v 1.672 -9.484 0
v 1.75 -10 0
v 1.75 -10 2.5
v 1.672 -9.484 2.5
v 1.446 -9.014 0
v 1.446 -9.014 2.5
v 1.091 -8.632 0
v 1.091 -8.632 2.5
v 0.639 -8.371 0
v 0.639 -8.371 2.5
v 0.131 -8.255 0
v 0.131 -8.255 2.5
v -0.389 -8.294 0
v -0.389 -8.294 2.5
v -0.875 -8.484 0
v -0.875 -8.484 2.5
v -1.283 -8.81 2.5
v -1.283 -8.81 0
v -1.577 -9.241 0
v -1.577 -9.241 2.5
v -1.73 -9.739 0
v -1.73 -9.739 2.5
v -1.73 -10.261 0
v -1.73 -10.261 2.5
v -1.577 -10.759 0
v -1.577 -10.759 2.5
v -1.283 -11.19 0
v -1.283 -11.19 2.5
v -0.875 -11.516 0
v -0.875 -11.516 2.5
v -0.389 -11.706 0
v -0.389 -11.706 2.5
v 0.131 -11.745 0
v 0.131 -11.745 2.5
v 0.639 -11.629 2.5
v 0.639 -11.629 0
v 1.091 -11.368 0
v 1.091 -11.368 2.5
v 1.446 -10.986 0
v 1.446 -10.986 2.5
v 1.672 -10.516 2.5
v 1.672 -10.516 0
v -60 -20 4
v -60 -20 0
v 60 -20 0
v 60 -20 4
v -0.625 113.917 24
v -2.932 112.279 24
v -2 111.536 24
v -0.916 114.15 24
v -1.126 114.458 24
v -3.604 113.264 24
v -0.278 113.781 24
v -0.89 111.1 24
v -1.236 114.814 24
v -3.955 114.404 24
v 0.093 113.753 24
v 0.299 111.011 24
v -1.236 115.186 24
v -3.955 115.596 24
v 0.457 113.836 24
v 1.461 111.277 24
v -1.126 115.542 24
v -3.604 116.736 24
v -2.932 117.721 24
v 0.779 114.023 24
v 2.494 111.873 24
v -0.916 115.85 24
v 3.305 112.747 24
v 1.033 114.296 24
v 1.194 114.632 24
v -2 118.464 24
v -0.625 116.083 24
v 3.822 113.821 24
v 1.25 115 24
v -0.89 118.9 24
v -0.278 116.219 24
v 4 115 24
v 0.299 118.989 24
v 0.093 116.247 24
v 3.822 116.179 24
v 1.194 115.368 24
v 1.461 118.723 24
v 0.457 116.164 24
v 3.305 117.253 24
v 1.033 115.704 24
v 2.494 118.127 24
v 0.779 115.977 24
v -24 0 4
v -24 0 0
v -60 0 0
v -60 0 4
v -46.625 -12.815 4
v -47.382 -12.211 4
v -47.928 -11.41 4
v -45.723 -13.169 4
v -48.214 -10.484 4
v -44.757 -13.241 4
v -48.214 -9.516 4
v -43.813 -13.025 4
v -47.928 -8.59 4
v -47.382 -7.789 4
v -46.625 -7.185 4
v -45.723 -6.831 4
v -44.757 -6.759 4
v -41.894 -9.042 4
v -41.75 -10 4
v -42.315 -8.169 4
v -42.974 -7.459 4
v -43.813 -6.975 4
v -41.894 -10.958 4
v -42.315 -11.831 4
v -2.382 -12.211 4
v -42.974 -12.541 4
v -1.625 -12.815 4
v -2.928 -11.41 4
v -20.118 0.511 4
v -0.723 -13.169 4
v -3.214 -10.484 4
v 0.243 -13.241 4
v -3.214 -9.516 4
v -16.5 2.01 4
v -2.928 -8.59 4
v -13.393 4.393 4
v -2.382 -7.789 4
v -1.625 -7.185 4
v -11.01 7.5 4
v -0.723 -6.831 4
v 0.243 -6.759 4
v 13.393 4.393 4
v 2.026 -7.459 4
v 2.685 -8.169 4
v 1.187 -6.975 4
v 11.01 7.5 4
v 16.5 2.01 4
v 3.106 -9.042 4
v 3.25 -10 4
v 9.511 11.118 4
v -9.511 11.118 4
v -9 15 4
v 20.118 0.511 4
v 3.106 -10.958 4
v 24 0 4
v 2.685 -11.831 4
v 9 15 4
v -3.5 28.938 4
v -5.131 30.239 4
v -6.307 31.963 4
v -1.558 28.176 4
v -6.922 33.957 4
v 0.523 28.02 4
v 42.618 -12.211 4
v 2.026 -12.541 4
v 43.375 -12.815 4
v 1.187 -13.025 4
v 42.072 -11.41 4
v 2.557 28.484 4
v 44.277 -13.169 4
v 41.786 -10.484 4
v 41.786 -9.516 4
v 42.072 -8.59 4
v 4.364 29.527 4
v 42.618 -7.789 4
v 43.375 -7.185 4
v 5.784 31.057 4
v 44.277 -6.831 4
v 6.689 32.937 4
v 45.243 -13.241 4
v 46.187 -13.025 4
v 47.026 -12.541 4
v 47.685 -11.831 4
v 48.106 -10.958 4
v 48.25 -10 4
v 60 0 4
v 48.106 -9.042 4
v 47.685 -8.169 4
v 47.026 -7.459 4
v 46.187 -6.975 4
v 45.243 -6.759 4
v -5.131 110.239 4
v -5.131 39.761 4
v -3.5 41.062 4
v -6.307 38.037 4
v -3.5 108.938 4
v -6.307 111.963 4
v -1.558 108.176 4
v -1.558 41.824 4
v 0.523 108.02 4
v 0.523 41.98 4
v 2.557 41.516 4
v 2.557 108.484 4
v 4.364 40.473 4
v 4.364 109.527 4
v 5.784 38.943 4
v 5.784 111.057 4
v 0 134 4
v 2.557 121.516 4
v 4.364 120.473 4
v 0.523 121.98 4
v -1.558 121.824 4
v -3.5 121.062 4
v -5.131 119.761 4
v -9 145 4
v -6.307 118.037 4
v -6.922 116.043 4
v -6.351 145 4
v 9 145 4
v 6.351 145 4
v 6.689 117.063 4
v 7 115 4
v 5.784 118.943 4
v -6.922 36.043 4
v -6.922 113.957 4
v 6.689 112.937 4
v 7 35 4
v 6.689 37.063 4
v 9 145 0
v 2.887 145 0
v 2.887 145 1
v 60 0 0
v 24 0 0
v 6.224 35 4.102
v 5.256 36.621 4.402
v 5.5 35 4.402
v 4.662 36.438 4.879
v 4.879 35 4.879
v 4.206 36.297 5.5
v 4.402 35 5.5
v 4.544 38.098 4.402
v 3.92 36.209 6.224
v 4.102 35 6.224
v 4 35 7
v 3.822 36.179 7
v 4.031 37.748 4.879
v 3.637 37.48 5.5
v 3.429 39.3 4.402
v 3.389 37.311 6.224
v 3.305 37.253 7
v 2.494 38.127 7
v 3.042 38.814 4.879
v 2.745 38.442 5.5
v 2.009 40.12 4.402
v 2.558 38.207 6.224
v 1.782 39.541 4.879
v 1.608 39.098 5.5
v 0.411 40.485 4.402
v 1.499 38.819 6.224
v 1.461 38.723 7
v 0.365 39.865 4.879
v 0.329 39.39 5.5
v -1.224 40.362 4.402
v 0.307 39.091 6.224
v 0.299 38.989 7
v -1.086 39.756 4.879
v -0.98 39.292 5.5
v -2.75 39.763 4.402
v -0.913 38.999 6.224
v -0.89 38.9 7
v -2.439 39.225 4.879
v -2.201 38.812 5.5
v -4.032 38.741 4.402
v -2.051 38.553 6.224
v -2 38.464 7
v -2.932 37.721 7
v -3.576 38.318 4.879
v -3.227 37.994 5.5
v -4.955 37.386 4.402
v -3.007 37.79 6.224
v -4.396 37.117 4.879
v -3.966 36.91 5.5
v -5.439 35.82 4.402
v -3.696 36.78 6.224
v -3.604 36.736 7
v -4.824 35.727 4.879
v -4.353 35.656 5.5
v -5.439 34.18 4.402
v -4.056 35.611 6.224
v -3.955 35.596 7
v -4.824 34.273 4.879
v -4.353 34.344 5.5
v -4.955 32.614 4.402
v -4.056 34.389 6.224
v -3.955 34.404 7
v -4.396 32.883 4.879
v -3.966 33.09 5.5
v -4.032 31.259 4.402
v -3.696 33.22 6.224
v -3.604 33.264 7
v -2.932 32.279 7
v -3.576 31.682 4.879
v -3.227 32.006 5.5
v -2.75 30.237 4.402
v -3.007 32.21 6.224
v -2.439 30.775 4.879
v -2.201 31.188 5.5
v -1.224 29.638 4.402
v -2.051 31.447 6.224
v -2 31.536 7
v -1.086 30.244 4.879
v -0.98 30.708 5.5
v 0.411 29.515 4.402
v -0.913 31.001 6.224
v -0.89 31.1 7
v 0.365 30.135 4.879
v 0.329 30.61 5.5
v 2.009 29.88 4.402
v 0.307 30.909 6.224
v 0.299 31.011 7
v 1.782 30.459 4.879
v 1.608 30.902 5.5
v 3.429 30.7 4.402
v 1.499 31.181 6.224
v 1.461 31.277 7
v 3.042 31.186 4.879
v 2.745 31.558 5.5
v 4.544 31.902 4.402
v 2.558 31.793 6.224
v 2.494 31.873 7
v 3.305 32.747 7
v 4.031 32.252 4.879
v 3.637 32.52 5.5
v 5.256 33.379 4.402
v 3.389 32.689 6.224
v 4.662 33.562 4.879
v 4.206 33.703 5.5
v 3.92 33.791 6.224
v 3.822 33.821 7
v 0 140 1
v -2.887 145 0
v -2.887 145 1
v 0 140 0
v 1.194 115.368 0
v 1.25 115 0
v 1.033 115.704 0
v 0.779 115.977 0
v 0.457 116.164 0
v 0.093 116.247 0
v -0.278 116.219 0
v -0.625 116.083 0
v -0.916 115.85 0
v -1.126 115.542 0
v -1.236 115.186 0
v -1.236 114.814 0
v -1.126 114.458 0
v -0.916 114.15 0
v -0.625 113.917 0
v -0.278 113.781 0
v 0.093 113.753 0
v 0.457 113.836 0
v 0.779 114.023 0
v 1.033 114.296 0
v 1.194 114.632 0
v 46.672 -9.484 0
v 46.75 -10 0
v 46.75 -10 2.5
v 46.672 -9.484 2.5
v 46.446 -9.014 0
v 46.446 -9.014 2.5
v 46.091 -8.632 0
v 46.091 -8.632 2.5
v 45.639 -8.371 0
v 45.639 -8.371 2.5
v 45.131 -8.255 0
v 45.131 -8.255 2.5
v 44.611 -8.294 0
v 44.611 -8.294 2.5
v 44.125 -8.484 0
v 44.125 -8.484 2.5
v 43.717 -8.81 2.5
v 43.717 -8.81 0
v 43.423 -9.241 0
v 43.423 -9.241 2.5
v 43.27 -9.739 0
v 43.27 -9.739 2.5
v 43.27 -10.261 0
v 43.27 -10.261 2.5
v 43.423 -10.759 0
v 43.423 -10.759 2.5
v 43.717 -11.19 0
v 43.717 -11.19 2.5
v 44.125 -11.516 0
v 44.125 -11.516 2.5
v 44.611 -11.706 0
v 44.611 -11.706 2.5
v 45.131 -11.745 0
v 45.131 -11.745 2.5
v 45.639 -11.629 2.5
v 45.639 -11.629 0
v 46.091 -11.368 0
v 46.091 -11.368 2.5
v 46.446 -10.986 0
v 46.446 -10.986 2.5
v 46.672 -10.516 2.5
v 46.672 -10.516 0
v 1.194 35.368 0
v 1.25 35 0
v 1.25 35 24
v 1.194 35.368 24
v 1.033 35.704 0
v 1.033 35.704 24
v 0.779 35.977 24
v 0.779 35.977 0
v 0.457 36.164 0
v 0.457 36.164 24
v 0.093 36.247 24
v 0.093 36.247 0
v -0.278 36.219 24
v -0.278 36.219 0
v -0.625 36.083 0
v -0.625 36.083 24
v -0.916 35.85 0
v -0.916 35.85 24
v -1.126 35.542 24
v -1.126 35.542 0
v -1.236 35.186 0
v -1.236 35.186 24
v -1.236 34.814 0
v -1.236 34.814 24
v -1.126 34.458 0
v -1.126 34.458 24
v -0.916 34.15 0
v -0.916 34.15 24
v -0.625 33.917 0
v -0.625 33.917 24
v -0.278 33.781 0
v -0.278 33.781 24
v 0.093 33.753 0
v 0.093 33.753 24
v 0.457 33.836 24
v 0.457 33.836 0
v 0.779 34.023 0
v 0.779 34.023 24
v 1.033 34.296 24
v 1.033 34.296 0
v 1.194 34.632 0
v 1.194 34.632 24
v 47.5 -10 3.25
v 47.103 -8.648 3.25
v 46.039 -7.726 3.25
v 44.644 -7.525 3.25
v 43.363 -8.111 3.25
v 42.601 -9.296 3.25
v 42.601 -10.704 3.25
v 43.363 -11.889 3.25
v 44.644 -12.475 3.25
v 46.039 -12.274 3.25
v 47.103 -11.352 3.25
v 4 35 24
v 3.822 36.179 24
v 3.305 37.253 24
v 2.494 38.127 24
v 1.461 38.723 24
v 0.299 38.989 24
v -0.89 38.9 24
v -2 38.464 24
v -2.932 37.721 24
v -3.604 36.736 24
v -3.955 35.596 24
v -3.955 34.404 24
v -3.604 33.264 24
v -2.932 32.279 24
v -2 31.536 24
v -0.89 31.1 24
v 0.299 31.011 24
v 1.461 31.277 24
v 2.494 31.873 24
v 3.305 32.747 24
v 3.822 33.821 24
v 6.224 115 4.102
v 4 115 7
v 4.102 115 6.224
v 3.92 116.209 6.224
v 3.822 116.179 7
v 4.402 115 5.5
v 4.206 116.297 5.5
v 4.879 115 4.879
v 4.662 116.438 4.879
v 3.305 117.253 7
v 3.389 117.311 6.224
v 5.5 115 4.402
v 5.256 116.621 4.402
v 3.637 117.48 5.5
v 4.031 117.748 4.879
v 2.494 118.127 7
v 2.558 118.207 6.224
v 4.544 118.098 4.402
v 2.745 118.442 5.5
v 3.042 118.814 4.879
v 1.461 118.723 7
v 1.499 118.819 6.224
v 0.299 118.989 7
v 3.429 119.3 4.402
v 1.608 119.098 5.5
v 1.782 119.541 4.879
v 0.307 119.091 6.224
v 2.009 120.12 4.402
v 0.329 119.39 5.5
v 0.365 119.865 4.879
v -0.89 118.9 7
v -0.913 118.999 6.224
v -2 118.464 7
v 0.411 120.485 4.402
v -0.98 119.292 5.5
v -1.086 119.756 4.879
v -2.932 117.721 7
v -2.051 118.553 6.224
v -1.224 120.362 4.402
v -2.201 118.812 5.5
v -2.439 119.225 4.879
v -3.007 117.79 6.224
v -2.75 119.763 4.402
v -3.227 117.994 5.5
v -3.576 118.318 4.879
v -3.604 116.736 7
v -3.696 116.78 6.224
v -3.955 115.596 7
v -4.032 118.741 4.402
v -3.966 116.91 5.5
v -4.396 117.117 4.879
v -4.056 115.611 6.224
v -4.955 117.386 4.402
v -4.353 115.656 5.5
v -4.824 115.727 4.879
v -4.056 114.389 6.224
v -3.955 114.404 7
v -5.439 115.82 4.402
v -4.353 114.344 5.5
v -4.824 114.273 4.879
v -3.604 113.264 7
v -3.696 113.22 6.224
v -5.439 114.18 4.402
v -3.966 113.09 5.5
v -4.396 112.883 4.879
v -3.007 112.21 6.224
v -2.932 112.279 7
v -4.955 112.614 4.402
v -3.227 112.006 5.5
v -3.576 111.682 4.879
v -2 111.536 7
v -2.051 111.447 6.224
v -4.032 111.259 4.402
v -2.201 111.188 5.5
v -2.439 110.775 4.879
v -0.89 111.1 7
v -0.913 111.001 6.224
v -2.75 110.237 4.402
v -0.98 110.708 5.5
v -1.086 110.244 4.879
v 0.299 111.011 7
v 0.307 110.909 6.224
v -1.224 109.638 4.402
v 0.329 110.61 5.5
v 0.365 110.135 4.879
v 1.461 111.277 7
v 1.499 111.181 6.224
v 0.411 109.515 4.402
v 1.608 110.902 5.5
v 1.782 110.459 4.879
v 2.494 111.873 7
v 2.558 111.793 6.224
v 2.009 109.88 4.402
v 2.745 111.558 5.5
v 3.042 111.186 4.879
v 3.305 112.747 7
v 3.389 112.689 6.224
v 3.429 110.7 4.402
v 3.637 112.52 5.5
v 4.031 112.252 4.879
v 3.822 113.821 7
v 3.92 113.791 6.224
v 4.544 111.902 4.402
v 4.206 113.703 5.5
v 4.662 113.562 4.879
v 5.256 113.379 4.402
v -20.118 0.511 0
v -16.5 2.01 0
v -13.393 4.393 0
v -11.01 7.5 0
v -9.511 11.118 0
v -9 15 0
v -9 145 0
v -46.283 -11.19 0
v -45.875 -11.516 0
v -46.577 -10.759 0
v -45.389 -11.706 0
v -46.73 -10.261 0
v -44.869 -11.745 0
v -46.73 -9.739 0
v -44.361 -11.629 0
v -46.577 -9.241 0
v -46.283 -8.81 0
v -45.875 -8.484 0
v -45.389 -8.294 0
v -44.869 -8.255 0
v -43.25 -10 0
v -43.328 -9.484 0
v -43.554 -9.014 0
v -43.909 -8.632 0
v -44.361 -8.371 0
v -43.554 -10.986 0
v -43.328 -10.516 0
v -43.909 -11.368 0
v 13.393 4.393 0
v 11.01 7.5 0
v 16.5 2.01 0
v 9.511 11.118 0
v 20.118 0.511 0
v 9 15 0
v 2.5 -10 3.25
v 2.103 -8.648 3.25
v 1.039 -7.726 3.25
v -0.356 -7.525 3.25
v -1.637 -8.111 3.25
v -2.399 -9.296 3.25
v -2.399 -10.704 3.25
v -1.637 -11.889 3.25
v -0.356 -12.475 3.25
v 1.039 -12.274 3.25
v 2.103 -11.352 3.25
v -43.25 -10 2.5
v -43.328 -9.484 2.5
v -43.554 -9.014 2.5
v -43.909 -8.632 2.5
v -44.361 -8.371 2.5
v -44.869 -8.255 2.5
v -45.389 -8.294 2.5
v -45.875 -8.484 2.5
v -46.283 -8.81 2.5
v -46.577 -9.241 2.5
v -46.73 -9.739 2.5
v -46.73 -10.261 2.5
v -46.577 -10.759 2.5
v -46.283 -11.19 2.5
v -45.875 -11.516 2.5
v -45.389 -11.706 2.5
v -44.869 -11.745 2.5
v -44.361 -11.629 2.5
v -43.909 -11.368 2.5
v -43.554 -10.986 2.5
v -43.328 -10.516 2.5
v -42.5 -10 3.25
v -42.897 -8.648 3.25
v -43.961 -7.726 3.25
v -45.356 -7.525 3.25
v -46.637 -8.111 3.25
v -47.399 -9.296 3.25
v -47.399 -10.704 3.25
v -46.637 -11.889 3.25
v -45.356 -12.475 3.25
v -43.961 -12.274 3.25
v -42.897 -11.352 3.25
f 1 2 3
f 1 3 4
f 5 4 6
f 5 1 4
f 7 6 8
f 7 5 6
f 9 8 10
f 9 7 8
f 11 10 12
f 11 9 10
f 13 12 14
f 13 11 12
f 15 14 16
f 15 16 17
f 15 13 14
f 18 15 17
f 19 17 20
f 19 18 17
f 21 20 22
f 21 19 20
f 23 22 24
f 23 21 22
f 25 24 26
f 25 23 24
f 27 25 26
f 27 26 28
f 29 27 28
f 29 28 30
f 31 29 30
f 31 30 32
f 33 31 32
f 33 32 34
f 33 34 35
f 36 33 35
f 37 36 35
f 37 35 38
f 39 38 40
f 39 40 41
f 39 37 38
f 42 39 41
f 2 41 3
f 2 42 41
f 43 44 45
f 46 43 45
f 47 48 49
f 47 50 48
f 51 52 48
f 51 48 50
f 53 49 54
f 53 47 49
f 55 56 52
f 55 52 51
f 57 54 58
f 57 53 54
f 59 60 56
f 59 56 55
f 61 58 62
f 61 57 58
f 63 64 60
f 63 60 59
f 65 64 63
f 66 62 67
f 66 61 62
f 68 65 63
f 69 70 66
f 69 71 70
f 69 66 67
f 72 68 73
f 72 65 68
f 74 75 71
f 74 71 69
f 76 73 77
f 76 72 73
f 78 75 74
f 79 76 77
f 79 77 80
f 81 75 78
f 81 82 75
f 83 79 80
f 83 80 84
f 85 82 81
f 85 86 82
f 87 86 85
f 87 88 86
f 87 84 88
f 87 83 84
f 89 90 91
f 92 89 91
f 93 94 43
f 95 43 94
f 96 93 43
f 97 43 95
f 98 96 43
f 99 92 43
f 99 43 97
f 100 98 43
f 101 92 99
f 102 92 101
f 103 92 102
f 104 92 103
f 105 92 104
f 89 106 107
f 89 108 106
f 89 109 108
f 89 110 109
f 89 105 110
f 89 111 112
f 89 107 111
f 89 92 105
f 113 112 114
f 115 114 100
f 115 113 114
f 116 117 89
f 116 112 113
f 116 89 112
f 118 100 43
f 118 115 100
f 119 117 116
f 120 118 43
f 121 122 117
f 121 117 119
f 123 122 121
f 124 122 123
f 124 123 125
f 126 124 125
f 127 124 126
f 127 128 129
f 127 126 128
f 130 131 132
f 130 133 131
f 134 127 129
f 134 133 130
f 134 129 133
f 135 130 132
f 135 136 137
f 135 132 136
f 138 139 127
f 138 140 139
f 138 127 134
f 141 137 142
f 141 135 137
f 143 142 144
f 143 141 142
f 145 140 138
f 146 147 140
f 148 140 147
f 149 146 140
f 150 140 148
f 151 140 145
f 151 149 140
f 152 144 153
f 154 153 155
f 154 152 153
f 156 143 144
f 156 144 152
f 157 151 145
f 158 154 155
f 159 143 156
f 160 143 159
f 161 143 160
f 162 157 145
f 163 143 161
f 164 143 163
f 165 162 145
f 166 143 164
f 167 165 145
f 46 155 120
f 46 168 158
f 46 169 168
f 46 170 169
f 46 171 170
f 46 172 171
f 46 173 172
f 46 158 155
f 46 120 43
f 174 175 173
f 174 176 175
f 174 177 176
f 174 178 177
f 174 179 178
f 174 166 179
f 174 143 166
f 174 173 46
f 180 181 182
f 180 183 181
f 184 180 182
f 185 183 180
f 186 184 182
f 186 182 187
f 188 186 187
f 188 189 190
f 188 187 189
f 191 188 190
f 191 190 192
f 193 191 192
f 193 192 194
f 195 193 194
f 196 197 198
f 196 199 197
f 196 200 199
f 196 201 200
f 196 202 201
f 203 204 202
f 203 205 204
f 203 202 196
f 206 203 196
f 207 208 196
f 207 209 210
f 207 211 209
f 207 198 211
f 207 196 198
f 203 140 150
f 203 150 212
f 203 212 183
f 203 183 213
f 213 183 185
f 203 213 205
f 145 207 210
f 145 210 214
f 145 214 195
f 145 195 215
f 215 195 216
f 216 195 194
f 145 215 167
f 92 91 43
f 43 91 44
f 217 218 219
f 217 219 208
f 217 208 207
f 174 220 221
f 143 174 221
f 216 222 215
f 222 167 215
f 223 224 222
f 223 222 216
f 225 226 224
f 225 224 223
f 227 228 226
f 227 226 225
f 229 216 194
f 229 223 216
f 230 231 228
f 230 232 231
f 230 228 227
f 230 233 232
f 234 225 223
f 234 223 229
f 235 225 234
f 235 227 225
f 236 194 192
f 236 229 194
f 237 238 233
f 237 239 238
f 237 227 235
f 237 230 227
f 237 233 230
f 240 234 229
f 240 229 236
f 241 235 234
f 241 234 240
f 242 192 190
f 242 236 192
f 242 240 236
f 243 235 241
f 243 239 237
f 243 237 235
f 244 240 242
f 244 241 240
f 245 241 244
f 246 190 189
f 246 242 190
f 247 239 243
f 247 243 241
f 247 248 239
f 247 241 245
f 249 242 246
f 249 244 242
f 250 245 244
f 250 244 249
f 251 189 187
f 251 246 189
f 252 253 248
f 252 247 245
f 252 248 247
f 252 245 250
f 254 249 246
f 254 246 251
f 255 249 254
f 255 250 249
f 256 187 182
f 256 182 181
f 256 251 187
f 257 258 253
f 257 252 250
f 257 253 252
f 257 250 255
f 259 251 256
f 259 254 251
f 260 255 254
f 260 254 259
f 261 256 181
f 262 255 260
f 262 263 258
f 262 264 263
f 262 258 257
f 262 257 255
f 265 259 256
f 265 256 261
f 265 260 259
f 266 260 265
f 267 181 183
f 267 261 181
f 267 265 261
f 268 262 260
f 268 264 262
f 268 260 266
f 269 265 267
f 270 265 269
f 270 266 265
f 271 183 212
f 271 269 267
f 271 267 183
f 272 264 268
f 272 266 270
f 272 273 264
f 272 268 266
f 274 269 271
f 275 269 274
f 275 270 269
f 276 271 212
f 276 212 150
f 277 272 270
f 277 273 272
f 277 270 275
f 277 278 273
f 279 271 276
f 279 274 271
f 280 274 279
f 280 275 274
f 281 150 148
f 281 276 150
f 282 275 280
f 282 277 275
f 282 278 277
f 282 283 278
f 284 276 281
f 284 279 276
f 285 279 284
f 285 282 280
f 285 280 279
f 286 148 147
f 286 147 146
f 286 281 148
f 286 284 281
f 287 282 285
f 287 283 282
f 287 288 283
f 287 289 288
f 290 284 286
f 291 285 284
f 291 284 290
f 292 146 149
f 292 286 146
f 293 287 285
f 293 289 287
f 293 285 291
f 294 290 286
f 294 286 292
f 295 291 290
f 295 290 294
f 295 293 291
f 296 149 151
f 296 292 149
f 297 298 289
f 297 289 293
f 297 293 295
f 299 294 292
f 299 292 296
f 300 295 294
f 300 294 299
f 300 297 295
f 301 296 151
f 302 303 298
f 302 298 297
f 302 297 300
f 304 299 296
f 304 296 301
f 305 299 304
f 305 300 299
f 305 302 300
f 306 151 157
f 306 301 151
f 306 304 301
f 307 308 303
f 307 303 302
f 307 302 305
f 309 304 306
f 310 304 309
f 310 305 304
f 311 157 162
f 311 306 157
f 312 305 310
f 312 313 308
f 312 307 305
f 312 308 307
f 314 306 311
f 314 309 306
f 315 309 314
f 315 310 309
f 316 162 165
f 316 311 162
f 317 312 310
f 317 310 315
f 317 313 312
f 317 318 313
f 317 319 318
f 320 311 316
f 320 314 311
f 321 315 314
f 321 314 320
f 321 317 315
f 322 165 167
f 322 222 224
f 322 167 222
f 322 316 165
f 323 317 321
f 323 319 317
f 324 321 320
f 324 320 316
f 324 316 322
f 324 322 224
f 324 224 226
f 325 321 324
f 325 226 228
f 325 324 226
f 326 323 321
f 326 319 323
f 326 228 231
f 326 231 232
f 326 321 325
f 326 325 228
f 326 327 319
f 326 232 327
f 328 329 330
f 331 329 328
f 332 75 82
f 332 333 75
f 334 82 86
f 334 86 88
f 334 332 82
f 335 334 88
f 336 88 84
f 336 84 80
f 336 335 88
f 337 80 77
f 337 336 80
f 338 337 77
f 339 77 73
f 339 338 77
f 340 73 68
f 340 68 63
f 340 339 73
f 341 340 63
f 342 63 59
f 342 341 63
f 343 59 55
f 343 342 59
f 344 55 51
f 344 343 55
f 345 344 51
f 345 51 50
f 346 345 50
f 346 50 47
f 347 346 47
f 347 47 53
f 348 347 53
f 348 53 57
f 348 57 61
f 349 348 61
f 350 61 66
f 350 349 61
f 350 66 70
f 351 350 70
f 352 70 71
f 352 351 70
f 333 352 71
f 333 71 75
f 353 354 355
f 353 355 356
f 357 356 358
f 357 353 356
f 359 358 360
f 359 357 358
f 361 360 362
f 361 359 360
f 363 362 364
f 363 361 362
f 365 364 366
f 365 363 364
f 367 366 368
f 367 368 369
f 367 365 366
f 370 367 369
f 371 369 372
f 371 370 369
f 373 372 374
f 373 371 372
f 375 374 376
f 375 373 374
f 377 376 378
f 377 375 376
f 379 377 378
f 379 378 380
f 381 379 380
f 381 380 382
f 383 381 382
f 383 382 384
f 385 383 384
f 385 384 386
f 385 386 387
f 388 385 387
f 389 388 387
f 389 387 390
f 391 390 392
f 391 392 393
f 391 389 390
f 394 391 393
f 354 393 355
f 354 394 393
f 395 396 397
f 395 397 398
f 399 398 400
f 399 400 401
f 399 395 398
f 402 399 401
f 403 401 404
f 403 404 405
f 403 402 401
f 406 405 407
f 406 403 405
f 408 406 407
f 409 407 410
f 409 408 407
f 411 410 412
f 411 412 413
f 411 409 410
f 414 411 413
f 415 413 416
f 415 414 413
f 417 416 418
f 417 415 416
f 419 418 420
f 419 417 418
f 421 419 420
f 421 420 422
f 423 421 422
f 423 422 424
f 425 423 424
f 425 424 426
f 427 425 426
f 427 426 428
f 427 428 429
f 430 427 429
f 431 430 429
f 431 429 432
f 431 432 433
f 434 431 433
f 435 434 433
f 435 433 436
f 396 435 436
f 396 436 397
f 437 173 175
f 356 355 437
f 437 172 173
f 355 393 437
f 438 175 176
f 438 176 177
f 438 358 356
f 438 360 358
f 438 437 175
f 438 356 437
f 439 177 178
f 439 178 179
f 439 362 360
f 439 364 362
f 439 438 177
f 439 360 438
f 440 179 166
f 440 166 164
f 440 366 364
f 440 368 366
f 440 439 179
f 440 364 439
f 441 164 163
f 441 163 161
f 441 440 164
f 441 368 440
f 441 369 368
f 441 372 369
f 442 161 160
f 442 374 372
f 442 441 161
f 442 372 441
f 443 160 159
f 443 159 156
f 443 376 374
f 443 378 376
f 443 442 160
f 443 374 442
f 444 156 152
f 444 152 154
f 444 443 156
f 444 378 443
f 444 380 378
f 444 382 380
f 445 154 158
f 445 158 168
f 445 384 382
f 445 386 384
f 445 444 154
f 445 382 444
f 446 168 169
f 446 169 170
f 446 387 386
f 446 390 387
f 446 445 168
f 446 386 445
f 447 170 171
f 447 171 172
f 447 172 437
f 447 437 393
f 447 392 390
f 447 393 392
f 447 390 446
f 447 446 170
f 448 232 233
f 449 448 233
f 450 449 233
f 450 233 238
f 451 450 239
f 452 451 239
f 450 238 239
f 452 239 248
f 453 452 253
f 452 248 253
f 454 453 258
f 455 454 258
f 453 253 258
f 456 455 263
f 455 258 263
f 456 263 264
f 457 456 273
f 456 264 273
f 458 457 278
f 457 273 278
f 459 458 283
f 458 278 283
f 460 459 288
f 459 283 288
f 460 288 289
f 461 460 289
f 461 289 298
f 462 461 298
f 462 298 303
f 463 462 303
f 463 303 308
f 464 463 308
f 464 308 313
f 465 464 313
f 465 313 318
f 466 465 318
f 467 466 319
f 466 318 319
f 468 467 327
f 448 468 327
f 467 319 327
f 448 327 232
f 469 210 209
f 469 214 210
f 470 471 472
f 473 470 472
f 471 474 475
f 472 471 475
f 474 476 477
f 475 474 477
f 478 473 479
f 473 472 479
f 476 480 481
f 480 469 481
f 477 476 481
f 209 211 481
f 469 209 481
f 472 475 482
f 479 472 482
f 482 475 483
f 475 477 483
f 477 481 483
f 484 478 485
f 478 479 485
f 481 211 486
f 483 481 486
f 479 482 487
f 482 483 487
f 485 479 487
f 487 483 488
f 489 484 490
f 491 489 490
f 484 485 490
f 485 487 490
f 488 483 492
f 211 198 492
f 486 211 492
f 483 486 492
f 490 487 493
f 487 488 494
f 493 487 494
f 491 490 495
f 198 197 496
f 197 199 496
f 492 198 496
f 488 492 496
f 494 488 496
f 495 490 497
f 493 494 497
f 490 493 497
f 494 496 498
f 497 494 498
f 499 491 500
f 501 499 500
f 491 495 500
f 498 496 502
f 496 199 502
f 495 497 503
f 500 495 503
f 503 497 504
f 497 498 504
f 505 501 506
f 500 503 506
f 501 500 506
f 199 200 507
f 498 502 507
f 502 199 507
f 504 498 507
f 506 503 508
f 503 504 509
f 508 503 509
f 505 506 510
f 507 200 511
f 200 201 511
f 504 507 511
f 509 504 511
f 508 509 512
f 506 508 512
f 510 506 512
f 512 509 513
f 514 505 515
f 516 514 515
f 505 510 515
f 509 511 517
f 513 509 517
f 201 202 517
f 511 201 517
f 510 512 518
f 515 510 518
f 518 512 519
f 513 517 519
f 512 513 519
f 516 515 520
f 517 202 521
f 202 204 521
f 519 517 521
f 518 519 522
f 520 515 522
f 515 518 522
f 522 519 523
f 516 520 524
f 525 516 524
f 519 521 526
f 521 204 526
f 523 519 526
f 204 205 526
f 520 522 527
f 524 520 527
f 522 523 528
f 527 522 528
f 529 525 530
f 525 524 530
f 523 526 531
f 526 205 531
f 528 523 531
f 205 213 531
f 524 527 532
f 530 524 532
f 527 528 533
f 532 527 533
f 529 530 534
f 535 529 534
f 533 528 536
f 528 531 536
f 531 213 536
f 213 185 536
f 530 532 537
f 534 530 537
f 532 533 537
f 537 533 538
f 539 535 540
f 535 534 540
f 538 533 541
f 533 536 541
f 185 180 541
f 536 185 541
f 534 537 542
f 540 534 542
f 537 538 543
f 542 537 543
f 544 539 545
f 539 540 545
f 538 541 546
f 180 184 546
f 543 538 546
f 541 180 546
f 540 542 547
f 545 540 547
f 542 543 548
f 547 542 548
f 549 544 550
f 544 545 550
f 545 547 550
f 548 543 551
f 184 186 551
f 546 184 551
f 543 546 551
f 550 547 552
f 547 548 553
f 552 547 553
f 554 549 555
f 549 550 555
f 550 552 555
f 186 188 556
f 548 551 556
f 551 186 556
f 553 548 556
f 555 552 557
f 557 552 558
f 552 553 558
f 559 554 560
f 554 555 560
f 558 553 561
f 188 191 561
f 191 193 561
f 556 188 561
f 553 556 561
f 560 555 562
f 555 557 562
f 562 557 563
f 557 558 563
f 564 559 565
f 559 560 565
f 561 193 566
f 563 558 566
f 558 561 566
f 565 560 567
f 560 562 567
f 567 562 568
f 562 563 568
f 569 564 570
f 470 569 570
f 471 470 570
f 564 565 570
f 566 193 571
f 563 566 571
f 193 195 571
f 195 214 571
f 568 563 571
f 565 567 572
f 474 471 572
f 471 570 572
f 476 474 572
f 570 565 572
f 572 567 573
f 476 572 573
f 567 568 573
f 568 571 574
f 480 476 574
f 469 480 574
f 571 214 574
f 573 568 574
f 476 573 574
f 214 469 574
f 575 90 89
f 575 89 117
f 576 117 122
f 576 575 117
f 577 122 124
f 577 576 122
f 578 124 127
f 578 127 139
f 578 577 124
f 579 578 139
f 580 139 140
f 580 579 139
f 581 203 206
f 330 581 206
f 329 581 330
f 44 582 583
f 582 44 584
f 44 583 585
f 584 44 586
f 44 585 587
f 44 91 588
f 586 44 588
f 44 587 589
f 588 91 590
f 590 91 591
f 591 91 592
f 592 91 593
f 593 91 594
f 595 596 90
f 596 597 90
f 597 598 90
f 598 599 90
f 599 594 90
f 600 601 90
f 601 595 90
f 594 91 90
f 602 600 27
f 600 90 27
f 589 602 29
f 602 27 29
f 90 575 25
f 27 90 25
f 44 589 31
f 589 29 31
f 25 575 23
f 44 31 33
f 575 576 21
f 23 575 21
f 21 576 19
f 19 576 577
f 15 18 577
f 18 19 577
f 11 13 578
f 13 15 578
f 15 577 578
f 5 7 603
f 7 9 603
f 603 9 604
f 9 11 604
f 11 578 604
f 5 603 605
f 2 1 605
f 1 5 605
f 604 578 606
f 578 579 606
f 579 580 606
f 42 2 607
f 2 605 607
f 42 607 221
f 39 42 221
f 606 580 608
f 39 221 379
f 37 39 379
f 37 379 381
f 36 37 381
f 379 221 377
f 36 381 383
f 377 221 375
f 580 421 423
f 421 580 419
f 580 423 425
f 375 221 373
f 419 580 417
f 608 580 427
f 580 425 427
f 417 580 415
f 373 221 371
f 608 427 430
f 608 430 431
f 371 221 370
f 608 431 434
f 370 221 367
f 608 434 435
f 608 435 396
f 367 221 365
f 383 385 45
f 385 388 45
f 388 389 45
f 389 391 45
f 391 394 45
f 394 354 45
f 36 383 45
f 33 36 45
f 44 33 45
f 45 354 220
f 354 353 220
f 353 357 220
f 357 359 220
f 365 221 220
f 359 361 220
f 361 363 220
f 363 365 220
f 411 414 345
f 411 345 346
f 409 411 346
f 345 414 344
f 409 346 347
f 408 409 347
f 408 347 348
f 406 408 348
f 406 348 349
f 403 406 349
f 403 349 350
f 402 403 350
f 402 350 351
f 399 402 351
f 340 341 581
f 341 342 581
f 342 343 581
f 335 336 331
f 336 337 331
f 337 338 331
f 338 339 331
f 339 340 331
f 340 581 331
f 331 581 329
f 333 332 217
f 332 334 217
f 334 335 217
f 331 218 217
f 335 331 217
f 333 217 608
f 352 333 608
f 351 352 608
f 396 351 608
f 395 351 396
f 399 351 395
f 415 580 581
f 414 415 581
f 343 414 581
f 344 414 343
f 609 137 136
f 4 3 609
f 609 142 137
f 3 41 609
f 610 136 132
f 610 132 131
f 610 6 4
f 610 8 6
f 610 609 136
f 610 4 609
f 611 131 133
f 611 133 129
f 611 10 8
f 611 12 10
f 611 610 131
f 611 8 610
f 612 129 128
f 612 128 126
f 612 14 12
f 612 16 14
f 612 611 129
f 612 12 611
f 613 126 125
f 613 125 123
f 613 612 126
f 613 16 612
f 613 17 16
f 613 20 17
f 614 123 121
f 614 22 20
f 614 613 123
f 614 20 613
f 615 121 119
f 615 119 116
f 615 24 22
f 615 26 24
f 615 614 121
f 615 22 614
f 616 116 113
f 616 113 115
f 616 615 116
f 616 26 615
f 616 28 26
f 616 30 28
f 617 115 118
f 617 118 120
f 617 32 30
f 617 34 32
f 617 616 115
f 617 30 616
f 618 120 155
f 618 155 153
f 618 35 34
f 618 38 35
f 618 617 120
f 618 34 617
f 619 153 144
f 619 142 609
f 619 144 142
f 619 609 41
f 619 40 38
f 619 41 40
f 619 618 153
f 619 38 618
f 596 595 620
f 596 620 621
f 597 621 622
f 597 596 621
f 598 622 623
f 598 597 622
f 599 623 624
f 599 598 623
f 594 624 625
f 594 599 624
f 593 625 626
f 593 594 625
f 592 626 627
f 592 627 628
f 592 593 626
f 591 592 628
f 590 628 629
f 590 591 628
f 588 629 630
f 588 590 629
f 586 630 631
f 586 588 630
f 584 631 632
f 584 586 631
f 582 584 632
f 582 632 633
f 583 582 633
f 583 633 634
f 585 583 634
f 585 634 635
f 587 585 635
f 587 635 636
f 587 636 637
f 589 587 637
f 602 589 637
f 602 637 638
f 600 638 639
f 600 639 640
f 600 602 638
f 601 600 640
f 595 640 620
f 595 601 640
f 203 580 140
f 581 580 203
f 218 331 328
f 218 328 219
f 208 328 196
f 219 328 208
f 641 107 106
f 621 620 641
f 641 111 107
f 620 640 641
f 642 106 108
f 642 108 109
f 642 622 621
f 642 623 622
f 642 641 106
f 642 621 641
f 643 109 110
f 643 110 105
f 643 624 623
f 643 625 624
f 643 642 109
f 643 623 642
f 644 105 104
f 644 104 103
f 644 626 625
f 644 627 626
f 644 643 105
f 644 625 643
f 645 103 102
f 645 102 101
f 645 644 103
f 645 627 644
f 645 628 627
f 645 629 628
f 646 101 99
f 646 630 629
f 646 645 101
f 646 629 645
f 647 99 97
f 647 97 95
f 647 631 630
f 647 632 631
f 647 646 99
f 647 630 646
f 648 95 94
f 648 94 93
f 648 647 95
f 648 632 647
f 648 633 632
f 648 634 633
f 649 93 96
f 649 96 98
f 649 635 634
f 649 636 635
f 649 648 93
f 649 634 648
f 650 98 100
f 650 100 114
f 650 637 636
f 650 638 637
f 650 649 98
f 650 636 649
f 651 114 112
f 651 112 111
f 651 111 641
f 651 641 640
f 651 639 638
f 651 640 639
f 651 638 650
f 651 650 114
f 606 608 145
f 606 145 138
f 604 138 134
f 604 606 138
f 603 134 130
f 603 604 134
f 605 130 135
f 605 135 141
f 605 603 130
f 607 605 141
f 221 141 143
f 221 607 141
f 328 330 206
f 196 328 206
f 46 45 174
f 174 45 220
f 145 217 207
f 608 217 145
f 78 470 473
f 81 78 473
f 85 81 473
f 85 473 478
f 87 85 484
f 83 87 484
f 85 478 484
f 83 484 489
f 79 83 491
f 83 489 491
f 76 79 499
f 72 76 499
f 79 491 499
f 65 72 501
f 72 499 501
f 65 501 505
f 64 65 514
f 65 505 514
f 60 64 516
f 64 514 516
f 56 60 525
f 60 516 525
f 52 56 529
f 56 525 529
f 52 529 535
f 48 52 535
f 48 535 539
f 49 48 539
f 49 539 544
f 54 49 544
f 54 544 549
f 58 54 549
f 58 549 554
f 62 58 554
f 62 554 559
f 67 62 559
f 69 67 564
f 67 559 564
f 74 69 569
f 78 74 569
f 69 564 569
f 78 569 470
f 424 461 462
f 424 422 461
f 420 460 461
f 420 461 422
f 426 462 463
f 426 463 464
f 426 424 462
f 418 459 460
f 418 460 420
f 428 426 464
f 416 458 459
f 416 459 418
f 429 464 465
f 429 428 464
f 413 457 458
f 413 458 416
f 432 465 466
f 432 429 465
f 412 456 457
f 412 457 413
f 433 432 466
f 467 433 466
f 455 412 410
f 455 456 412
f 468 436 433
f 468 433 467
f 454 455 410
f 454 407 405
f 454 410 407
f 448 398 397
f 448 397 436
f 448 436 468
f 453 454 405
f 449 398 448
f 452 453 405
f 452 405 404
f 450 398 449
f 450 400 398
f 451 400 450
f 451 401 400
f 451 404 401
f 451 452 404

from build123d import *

# Parameters (mm, degrees)
SKETCH_R        = 1.75
SKETCH_R_2      = 1.25
PAD_DEPTH       = 4
SKETCH001_R     = 4
SKETCH001_R_2   = 1.25
PAD001_DEPTH    = 20
FILLET_R        = 3
FILLET001_R     = 3
CHAMFER_SIZE    = 1.5
CHAMFER001_SIZE = 3


with BuildPart() as part:
    # Sketch → Pad (new body)
    with BuildSketch(Plane.XY):
        with BuildLine():
            Line((-24, 0), (-60, 0))
            Line((-60, 0), (-60, -20))
            Line((-60, -20), (60, -20))
            Line((60, -20), (60, 0))
            Line((60, 0), (24, 0))
            ThreePointArc((9, 15), (13.393398, 4.393398), (24, 0))
            Line((9, 145), (9, 15))
            Line((2.886751, 145), (9, 145))
            Line((0, 140), (2.886751, 145))
            Line((-2.886751, 145), (0, 140))
            Line((-9, 145), (-2.886751, 145))
            Line((-9, 15), (-9, 145))
            ThreePointArc((-24, 0), (-13.393398, 4.393398), (-9, 15))
        make_face()
        with Locations((-45, -10)):
            Circle(SKETCH_R, mode=Mode.SUBTRACT)
        with Locations((45, -10)):
            Circle(SKETCH_R, mode=Mode.SUBTRACT)
        with Locations((0, -10)):
            Circle(SKETCH_R, mode=Mode.SUBTRACT)
        with Locations((0, 35)):
            Circle(SKETCH_R_2, mode=Mode.SUBTRACT)
        with Locations((0, 115)):
            Circle(SKETCH_R_2, mode=Mode.SUBTRACT)
    extrude(amount=PAD_DEPTH)

    # Sketch001 (on Face20 of Pad) → Pad001 (join)
    with BuildSketch(Plane.XY.offset(4)):
        with Locations((0, 115)):
            Circle(SKETCH001_R)
        with Locations((0, 115)):
            Circle(SKETCH001_R_2, mode=Mode.SUBTRACT)
        with Locations((0, 35)):
            Circle(SKETCH001_R)
        with Locations((0, 35)):
            Circle(SKETCH001_R_2, mode=Mode.SUBTRACT)
    extrude(amount=PAD001_DEPTH)

    # Fillet
    fillet_edges = [part.edges().sort_by_distance(p)[0] for p in [
        (-4, 115, 4),
    ]]
    fillet(fillet_edges, radius=FILLET_R)

    # Fillet001
    fillet001_edges = [part.edges().sort_by_distance(p)[0] for p in [
        (-4, 35, 4),
    ]]
    fillet(fillet001_edges, radius=FILLET001_R)

    # Chamfer
    chamfer_edges = [part.edges().sort_by_distance(p)[0] for p in [
        (43.25, -10, 4),
        (-1.75, -10, 4),
        (-46.75, -10, 4),
    ]]
    chamfer(chamfer_edges, length=CHAMFER_SIZE)

    # Chamfer001
    chamfer001_edges = [part.edges().sort_by_distance(p)[0] for p in [
        (1.443376, 142.5, 4),
        (-1.443376, 142.5, 4),
    ]]
    chamfer(chamfer001_edges, length=CHAMFER001_SIZE)


solid = part.part
